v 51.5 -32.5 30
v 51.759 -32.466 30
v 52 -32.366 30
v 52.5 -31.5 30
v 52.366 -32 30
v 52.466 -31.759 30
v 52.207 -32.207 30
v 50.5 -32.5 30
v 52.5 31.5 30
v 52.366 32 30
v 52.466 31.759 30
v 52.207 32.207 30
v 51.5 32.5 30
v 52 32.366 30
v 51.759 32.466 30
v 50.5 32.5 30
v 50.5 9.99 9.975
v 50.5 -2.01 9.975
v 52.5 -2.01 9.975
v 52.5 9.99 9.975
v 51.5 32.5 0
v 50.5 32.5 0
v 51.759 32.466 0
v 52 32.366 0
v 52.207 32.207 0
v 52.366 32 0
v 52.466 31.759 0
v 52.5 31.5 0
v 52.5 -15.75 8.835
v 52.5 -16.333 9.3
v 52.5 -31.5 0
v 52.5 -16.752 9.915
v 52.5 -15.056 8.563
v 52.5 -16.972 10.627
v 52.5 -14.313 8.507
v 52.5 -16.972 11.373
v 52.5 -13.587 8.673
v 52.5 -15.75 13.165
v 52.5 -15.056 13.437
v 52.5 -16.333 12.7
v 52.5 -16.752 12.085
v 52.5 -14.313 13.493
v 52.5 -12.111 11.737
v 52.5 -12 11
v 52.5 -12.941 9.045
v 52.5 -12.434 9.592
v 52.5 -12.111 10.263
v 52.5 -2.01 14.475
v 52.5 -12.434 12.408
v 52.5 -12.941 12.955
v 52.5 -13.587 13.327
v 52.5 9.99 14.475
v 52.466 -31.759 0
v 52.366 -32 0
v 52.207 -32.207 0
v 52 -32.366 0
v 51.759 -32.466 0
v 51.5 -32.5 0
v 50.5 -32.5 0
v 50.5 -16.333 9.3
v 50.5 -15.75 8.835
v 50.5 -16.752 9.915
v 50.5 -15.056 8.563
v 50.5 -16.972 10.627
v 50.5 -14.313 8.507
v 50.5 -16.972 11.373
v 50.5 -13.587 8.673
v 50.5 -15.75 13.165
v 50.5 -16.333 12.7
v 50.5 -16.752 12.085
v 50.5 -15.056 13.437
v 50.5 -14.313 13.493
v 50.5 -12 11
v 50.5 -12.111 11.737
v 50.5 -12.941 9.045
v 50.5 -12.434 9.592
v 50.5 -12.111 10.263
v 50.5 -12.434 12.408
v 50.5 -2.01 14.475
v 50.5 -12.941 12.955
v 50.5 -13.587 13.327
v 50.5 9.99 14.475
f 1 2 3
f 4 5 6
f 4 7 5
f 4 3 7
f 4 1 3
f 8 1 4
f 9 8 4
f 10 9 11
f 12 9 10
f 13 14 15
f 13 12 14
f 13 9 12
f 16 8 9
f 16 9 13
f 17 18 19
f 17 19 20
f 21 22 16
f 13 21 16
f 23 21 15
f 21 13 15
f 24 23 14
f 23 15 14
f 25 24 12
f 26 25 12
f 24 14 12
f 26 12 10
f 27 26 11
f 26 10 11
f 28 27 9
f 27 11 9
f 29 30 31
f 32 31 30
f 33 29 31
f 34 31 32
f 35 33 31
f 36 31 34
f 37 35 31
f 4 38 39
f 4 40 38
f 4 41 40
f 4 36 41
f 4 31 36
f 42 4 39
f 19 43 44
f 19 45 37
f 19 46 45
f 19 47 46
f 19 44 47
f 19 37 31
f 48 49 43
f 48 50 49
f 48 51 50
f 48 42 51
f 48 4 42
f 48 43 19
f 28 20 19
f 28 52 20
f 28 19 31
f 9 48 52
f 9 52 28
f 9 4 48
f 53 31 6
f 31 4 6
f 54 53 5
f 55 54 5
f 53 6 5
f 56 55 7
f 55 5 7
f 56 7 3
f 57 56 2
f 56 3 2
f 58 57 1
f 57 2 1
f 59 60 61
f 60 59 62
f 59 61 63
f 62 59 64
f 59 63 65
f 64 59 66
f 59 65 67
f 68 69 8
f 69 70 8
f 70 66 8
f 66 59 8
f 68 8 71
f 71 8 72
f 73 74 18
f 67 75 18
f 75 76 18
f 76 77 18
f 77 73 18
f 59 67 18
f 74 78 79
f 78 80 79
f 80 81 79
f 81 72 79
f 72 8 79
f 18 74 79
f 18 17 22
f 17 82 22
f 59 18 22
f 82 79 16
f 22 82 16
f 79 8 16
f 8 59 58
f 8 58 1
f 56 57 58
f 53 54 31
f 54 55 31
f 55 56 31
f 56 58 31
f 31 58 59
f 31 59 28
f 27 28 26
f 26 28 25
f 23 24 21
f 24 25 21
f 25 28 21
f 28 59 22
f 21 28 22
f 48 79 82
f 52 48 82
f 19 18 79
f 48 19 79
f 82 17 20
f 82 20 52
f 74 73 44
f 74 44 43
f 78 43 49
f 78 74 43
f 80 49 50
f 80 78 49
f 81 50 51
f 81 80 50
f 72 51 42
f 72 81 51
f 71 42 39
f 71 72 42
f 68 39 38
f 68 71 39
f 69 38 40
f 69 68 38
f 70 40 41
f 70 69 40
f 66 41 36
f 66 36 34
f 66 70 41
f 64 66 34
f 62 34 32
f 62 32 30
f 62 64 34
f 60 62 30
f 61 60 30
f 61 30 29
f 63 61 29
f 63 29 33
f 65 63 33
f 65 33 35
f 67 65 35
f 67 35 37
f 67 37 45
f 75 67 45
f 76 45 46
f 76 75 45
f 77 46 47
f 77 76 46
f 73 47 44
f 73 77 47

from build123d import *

# Parameters (mm, degrees)
SKETCH004_W   = 65
SKETCH004_H   = 30
SKETCH004_R   = 2.5
SKETCH004_W_2 = 12
SKETCH004_H_2 = 4.5
PAD003_DEPTH  = 2
FILLET004_R   = 1
FILLET005_R   = 1


with BuildPart() as part:
    # Sketch004 → Pad003 (new body)
    with BuildSketch(Plane.YZ):
        with Locations((0, 15)):
            Rectangle(SKETCH004_W, SKETCH004_H)
        with Locations((-14.5, 11)):
            Circle(SKETCH004_R, mode=Mode.SUBTRACT)
        with Locations((3.989801, 12.224792)):
            Rectangle(SKETCH004_W_2, SKETCH004_H_2, mode=Mode.SUBTRACT)
    extrude(amount=PAD003_DEPTH)

    # Fillet004
    fillet004_edges = [part.edges().sort_by_distance(p)[0] for p in [
        (2, 32.5, 15),
    ]]
    fillet(fillet004_edges, radius=FILLET004_R)

    # Fillet005
    fillet005_edges = [part.edges().sort_by_distance(p)[0] for p in [
        (2, -32.5, 15),
    ]]
    fillet(fillet005_edges, radius=FILLET005_R)


with BuildPart() as part_1:
    # Body003 placement: moved
    add(part.part.moved(Location((50.5, 0, 0))))


solid = part_1.part
